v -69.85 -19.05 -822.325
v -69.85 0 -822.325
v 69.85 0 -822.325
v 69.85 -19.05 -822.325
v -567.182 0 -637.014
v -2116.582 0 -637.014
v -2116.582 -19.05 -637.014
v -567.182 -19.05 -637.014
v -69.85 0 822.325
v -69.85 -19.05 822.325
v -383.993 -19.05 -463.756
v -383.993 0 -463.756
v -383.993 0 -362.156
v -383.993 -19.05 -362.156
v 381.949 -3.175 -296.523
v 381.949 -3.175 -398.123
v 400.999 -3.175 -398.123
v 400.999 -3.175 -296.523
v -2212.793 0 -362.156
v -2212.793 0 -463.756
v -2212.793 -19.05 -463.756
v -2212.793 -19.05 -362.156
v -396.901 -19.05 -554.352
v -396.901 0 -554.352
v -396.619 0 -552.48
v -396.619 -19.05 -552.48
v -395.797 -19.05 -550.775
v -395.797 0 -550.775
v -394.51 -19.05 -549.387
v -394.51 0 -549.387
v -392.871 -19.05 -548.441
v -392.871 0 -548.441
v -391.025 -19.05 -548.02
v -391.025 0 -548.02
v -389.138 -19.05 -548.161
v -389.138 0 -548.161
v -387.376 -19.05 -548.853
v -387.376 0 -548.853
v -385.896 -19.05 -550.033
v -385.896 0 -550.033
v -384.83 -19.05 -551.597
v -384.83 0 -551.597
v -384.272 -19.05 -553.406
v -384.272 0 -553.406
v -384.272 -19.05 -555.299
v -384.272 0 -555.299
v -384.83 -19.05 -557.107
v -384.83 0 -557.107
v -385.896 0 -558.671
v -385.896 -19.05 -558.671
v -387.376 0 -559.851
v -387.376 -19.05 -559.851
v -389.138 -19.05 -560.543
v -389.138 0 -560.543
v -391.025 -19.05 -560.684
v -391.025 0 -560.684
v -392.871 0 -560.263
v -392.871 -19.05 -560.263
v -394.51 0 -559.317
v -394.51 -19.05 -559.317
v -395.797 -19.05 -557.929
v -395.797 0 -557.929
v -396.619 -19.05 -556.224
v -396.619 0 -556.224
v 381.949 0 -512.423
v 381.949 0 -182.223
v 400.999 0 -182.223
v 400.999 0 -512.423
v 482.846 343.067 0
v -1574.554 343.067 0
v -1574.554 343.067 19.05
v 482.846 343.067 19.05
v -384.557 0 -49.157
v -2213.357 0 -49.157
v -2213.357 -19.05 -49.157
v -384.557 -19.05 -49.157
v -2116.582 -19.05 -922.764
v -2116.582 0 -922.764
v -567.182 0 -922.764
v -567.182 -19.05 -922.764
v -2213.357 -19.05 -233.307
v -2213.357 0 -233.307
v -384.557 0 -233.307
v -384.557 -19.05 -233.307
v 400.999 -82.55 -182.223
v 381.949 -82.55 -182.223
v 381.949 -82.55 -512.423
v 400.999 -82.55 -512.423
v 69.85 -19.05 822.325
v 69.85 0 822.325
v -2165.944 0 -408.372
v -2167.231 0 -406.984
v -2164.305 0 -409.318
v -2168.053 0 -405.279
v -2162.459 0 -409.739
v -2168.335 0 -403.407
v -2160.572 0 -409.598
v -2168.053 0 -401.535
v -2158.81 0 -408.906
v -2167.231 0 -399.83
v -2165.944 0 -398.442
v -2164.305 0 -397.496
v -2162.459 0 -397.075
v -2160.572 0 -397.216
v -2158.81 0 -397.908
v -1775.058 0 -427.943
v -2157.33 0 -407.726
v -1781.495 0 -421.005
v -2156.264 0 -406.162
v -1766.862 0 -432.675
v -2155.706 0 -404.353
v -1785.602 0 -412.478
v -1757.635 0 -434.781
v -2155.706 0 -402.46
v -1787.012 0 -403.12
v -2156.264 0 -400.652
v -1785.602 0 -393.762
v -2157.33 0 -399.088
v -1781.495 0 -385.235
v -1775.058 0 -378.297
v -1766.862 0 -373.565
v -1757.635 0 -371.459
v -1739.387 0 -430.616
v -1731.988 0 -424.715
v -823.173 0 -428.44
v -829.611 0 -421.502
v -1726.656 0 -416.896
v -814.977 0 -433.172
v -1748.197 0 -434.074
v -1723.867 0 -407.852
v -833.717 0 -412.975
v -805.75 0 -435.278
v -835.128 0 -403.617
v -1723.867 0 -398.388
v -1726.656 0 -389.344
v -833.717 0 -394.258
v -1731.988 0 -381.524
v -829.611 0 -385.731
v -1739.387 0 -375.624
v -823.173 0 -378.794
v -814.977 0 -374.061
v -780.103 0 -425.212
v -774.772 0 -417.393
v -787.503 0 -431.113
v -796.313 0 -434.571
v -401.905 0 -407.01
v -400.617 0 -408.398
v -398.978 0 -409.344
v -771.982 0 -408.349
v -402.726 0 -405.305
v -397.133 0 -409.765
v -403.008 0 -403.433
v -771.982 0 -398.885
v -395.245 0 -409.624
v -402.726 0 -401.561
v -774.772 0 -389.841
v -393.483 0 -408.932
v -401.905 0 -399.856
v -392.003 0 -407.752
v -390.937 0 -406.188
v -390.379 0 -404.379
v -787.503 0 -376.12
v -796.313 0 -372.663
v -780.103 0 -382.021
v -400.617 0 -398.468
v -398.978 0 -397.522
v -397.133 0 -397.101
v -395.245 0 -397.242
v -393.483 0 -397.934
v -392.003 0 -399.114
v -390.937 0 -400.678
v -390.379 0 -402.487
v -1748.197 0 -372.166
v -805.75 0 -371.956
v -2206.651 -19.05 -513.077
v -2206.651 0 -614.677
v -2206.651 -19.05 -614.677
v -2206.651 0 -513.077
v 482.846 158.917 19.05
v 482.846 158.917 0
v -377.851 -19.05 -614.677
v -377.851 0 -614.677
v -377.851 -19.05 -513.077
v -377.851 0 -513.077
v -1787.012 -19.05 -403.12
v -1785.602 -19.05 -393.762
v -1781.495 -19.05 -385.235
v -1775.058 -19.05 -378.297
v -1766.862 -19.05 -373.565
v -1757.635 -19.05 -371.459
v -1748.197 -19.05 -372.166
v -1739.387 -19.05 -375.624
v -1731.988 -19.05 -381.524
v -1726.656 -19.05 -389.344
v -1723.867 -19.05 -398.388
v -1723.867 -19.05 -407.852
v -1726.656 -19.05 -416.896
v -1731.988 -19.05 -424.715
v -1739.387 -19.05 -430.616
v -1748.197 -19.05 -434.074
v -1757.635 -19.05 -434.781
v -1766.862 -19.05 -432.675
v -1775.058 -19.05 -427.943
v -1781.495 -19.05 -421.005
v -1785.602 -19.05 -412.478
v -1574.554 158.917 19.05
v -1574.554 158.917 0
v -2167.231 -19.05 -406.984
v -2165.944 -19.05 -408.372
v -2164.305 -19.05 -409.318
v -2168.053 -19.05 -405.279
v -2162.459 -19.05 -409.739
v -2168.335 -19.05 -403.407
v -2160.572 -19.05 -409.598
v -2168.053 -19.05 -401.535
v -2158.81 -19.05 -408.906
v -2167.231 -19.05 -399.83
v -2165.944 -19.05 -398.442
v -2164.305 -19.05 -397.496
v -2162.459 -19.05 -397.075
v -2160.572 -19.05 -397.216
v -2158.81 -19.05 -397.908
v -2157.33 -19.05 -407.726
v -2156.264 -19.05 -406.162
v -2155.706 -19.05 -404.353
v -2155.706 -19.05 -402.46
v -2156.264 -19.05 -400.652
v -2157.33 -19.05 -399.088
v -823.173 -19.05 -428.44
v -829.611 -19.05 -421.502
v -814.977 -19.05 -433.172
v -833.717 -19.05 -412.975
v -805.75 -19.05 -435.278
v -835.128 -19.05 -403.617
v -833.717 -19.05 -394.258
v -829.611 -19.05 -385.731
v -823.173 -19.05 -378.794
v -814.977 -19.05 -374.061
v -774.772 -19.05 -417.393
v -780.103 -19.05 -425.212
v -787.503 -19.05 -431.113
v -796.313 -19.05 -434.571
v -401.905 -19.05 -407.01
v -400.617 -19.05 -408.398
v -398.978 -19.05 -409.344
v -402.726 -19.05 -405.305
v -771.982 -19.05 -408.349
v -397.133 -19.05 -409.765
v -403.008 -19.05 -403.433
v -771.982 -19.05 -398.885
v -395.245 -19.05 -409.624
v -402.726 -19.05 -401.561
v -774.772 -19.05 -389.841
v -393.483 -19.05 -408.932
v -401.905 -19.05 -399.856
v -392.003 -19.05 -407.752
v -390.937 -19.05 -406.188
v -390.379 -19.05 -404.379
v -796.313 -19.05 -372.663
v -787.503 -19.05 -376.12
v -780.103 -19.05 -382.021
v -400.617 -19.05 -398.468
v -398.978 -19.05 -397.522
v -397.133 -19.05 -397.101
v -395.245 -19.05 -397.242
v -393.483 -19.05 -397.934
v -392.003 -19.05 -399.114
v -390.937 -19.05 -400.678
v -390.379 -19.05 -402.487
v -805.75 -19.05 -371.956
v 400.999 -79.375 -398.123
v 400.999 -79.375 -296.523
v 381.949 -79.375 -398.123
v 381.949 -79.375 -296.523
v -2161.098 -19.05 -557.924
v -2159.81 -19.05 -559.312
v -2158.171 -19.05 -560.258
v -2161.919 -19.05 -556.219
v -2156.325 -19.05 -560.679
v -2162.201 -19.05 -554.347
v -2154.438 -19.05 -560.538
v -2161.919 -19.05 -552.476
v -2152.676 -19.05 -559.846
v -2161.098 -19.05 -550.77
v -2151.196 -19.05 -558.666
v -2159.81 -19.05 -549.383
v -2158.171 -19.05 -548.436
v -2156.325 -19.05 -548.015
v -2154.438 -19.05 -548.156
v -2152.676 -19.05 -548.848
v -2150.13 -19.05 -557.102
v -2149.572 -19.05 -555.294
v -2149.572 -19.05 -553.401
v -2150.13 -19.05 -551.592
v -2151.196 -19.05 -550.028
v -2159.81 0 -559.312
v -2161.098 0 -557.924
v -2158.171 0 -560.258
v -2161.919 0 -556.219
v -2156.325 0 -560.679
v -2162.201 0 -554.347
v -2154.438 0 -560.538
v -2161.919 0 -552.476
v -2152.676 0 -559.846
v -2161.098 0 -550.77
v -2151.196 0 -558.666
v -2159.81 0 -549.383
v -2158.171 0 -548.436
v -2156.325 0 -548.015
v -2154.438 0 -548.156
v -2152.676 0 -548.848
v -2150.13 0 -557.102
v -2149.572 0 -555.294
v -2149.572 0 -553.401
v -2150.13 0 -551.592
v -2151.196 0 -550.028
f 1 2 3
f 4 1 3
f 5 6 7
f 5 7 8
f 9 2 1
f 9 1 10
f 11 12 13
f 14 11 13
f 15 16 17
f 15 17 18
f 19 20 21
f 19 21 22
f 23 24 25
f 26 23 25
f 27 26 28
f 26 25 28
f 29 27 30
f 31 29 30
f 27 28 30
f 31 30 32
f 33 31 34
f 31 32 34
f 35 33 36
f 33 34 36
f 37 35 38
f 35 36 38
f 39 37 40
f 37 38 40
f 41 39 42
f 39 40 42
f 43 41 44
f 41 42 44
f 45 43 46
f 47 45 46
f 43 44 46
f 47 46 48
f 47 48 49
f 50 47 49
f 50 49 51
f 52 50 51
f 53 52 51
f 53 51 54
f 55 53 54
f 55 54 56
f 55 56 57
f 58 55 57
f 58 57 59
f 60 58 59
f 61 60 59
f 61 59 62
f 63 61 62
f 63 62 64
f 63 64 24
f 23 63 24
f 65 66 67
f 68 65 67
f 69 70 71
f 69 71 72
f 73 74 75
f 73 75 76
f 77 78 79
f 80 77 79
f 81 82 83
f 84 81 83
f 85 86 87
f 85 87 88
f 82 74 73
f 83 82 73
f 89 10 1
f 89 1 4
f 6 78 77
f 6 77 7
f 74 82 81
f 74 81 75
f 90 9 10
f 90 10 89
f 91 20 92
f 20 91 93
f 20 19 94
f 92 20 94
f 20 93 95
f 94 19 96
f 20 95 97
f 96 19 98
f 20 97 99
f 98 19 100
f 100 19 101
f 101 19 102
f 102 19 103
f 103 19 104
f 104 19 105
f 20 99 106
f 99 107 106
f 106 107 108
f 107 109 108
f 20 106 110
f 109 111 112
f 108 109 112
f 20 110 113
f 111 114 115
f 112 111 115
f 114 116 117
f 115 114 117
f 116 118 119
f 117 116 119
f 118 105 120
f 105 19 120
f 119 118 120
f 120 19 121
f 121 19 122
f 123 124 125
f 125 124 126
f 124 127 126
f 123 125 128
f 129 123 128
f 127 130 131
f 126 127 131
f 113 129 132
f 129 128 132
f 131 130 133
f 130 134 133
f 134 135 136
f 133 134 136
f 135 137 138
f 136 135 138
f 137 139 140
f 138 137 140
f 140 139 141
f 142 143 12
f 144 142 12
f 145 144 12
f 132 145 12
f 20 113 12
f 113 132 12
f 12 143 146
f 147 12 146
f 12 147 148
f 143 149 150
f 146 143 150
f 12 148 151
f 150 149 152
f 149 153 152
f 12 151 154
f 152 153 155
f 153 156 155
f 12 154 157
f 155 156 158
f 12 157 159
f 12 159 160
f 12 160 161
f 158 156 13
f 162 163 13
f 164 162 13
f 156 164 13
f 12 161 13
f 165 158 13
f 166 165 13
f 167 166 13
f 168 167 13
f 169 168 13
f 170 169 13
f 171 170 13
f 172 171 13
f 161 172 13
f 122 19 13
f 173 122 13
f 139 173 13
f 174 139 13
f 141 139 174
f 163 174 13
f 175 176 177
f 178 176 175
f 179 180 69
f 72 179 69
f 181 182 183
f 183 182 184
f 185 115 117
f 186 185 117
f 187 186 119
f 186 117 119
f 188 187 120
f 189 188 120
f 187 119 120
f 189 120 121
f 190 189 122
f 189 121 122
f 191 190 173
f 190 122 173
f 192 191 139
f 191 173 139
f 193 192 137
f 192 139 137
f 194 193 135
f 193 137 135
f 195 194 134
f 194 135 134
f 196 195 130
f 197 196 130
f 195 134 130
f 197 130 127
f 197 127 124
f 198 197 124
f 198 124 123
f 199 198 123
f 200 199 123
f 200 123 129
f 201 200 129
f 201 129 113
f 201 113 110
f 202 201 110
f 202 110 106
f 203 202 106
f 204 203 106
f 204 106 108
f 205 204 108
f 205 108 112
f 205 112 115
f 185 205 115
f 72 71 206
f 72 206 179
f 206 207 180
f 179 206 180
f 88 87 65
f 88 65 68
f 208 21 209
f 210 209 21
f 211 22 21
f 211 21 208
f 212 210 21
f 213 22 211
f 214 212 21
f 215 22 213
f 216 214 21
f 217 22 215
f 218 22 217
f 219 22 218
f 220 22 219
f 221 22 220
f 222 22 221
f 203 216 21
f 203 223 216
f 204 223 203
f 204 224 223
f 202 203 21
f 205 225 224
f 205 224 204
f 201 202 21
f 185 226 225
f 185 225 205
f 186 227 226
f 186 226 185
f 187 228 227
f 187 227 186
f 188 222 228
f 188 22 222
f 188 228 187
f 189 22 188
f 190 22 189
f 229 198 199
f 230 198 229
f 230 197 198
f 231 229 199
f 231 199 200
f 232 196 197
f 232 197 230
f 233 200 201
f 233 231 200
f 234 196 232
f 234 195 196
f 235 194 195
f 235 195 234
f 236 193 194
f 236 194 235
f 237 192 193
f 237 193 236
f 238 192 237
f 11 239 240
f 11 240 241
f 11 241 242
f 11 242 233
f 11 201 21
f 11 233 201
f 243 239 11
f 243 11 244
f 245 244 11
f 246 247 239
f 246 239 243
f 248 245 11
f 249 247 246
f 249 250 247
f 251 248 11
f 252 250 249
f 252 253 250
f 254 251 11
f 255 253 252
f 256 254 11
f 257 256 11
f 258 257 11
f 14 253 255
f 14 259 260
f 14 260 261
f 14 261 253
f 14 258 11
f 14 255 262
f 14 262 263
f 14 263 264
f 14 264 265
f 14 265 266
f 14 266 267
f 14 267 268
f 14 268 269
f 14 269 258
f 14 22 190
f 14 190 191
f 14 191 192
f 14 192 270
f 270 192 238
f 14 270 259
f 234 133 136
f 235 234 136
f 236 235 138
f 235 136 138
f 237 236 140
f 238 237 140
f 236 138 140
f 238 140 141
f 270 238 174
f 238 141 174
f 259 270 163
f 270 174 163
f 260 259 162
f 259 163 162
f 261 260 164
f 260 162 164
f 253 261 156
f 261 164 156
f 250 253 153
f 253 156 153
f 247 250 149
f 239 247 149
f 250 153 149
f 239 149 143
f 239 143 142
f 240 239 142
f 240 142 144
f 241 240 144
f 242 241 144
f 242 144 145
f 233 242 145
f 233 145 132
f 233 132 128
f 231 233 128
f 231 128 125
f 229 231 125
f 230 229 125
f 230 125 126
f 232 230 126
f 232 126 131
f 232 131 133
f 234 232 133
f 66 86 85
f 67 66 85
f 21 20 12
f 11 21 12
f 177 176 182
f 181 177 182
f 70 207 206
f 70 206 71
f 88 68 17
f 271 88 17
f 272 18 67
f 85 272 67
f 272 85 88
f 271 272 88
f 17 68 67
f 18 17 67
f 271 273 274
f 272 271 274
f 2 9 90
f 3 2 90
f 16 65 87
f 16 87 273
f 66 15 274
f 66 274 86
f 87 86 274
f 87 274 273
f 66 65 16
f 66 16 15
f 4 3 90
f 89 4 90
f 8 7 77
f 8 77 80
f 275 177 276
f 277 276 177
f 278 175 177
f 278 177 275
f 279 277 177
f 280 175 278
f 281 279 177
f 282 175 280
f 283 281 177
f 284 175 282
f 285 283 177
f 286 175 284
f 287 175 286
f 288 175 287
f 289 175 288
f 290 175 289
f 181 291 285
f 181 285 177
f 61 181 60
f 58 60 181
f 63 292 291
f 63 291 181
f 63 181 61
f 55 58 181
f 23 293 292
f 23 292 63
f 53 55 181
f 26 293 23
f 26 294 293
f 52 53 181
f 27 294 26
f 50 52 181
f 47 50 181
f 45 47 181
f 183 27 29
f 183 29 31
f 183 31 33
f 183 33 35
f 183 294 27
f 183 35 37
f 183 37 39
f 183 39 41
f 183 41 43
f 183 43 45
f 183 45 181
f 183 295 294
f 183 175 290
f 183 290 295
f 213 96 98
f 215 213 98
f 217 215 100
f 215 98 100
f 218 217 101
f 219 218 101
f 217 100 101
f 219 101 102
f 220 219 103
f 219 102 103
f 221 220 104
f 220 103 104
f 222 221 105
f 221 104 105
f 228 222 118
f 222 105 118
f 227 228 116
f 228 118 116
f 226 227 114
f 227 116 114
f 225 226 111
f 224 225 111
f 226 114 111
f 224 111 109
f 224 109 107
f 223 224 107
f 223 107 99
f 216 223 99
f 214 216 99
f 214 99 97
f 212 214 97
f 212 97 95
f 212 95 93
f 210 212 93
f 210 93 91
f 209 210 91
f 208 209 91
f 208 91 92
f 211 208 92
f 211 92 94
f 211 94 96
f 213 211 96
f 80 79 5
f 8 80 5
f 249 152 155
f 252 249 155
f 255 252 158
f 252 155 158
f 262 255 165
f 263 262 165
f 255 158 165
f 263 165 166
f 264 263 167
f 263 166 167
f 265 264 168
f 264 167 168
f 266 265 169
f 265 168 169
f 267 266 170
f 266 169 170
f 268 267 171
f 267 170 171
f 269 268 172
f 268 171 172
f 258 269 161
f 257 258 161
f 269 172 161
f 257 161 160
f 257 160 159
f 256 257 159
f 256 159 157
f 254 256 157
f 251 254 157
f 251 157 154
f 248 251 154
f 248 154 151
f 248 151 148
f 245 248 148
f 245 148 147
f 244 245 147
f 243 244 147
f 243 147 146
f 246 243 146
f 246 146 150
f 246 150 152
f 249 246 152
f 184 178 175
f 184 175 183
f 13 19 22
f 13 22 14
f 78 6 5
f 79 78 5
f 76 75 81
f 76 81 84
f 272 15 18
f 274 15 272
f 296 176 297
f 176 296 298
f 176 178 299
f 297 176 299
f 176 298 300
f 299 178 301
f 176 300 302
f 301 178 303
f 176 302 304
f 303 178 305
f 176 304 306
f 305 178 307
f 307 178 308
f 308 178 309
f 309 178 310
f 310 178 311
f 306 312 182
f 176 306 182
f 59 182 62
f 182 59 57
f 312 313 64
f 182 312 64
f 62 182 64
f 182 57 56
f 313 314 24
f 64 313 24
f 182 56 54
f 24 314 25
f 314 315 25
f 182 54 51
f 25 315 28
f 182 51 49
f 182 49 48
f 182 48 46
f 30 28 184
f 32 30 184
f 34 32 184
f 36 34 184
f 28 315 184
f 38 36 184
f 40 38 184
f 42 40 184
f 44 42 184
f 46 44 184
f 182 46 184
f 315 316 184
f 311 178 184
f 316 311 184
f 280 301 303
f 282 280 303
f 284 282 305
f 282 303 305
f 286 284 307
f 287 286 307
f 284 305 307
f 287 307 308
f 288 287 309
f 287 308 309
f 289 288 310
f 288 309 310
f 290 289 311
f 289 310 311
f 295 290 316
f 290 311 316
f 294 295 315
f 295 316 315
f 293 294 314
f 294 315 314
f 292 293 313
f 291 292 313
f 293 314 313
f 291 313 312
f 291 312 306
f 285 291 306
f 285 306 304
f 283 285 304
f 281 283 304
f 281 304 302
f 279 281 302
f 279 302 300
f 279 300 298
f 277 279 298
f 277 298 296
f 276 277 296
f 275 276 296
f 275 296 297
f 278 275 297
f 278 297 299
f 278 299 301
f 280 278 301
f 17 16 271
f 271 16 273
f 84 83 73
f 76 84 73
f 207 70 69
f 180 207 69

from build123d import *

# Parameters (mm, degrees)
F0_W      = 139.7
F0_H      = 1644.65
F1_DEPTH  = 19.05
F2_W      = 2057.4
F2_H      = 184.15
F3_DEPTH  = 19.05
F4_W      = 1828.8
F4_H      = 184.15
F5_DEPTH  = 19.05
F6_W      = 1828.8
F6_H      = 101.6
F7_DEPTH  = 19.05
F8_W      = 19.05
F8_H      = 330.2
F9_DEPTH  = 82.55
F12_D     = 12.7
F13_W     = 1549.4
F13_H     = 285.75
F14_DEPTH = 19.05
F16_D     = 63.5
F17_W     = 1828.8
F17_H     = 101.6
F18_DEPTH = 19.05
F21_D     = 12.7
F22_W     = 76.2
F22_H     = 101.6
F23_DEPTH = 100.897944


with BuildPart() as f1:
    # F0 (on Front) → F1 (new body)
    with BuildSketch(Plane.XZ):
        Rectangle(F0_W, F0_H)
    extrude(amount=F1_DEPTH)


with BuildPart() as f3:
    # F2 (on Top) → F3 (new body)
    with BuildSketch(Plane.XY):
        with Locations((-545.853794, 250.992194)):
            Rectangle(F2_W, F2_H)
    extrude(amount=F3_DEPTH)


with BuildPart() as f5:
    # F4 (on Front) → F5 (new body)
    with BuildSketch(Plane.XZ):
        with Locations((-1298.957092, -141.23211)):
            Rectangle(F4_W, F4_H)
    extrude(amount=F5_DEPTH)


with BuildPart() as f7:
    # F6 (on Front) → F7 (new body)
    with BuildSketch(Plane.XZ):
        with Locations((-1298.39335, -412.956412)):
            Rectangle(F6_W, F6_H)
    extrude(amount=F7_DEPTH)

    # F12 (through all)
    with Locations(Plane.XZ.offset(19.05)):
        with Locations((-2161.984682, -403.406918), (-396.658272, -403.432995)):
            Hole(F12_D / 2)

    # F16 (through all)
    with Locations(Plane.XZ.offset(19.05)):
        with Locations((-803.377569, -403.616726), (-1755.262136, -403.119981)):
            Hole(F16_D / 2)


with BuildPart() as f9:
    # F8 (on Front) → F9 (new body)
    with BuildSketch(Plane.XZ):
        with Locations((391.474263, -347.32341)):
            Rectangle(F8_W, F8_H)
    extrude(amount=F9_DEPTH)

    # F22 (on face) → F23 (cut, through all)
    with BuildSketch(Plane(origin=(381.949263, 0, 0), x_dir=(0, -1, 0), z_dir=(-1, 0, 0))):
        with Locations((41.275, -347.32341)):
            Rectangle(F22_W, F22_H)
    extrude(amount=-F23_DEPTH, mode=Mode.SUBTRACT)


with BuildPart() as f14:
    # F13 (on Front) → F14 (new body)
    with BuildSketch(Plane.XZ):
        with Locations((-1341.881986, -779.88944)):
            Rectangle(F13_W, F13_H)
    extrude(amount=F14_DEPTH)


with BuildPart() as f18:
    # F17 (on Front) → F18 (new body)
    with BuildSketch(Plane.XZ):
        with Locations((-1292.25084, -563.877134)):
            Rectangle(F17_W, F17_H)
    extrude(amount=F18_DEPTH)

    # F21 (through all)
    with Locations(Plane.XZ.offset(19.05)):
        with Locations((-2155.850887, -554.347217), (-390.550882, -554.352105)):
            Hole(F21_D / 2)


solid = Compound([f1.part, f3.part, f5.part, f7.part, f9.part, f14.part, f18.part])
